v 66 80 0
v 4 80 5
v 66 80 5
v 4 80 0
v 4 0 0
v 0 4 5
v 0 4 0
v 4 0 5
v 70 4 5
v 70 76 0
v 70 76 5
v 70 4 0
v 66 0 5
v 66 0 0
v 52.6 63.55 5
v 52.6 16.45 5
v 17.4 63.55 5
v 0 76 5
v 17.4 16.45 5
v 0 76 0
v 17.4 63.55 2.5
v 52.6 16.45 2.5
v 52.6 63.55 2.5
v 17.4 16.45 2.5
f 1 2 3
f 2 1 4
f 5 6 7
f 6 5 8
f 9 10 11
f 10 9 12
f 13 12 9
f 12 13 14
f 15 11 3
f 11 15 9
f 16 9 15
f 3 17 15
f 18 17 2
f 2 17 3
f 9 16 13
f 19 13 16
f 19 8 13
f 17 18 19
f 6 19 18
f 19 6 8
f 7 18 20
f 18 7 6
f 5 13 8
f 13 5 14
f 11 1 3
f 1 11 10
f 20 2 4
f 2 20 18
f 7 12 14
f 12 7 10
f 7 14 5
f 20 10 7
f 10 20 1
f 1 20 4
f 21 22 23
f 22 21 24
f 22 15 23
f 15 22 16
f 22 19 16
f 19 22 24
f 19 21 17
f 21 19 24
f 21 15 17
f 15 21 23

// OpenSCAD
$fn = 32;

// ----------------------------------------------------------------------
// Windowed plate: 1 voids, 70 x 80 x 5 mm
// ----------------------------------------------------------------------

// --- parameters (mm) ---
plate_l = 70;             // plate length, X
plate_w = 80;             // plate width, Y
plate_t = 5;              // plate thickness, Z
edge_margin = 12;         // wall from the plate edge to any window
win1_l = 35.2;            // window length
win1_w = 47.1;            // window width
depth_1 = 2.5;            // depth of void 1 (full thickness = through)
corner_c = 4;             // corner chamfer of the plate

profile = [[4, 0], [66, 0], [70, 4], [70, 76], [66, 80], [4, 80], [0, 76], [0, 4]];  // primary outline, 8 points, counter clockwise
void_1 = [[17.4, 16.45], [52.6, 16.45], [52.6, 63.55], [17.4, 63.55]];  // large central window, 4 points

// --- the one profile operation ---
difference() {
  linear_extrude(height = plate_t) polygon(points = profile);
  translate([0, 0, plate_t - depth_1])
    linear_extrude(height = depth_1 + 1) polygon(points = void_1);
}
